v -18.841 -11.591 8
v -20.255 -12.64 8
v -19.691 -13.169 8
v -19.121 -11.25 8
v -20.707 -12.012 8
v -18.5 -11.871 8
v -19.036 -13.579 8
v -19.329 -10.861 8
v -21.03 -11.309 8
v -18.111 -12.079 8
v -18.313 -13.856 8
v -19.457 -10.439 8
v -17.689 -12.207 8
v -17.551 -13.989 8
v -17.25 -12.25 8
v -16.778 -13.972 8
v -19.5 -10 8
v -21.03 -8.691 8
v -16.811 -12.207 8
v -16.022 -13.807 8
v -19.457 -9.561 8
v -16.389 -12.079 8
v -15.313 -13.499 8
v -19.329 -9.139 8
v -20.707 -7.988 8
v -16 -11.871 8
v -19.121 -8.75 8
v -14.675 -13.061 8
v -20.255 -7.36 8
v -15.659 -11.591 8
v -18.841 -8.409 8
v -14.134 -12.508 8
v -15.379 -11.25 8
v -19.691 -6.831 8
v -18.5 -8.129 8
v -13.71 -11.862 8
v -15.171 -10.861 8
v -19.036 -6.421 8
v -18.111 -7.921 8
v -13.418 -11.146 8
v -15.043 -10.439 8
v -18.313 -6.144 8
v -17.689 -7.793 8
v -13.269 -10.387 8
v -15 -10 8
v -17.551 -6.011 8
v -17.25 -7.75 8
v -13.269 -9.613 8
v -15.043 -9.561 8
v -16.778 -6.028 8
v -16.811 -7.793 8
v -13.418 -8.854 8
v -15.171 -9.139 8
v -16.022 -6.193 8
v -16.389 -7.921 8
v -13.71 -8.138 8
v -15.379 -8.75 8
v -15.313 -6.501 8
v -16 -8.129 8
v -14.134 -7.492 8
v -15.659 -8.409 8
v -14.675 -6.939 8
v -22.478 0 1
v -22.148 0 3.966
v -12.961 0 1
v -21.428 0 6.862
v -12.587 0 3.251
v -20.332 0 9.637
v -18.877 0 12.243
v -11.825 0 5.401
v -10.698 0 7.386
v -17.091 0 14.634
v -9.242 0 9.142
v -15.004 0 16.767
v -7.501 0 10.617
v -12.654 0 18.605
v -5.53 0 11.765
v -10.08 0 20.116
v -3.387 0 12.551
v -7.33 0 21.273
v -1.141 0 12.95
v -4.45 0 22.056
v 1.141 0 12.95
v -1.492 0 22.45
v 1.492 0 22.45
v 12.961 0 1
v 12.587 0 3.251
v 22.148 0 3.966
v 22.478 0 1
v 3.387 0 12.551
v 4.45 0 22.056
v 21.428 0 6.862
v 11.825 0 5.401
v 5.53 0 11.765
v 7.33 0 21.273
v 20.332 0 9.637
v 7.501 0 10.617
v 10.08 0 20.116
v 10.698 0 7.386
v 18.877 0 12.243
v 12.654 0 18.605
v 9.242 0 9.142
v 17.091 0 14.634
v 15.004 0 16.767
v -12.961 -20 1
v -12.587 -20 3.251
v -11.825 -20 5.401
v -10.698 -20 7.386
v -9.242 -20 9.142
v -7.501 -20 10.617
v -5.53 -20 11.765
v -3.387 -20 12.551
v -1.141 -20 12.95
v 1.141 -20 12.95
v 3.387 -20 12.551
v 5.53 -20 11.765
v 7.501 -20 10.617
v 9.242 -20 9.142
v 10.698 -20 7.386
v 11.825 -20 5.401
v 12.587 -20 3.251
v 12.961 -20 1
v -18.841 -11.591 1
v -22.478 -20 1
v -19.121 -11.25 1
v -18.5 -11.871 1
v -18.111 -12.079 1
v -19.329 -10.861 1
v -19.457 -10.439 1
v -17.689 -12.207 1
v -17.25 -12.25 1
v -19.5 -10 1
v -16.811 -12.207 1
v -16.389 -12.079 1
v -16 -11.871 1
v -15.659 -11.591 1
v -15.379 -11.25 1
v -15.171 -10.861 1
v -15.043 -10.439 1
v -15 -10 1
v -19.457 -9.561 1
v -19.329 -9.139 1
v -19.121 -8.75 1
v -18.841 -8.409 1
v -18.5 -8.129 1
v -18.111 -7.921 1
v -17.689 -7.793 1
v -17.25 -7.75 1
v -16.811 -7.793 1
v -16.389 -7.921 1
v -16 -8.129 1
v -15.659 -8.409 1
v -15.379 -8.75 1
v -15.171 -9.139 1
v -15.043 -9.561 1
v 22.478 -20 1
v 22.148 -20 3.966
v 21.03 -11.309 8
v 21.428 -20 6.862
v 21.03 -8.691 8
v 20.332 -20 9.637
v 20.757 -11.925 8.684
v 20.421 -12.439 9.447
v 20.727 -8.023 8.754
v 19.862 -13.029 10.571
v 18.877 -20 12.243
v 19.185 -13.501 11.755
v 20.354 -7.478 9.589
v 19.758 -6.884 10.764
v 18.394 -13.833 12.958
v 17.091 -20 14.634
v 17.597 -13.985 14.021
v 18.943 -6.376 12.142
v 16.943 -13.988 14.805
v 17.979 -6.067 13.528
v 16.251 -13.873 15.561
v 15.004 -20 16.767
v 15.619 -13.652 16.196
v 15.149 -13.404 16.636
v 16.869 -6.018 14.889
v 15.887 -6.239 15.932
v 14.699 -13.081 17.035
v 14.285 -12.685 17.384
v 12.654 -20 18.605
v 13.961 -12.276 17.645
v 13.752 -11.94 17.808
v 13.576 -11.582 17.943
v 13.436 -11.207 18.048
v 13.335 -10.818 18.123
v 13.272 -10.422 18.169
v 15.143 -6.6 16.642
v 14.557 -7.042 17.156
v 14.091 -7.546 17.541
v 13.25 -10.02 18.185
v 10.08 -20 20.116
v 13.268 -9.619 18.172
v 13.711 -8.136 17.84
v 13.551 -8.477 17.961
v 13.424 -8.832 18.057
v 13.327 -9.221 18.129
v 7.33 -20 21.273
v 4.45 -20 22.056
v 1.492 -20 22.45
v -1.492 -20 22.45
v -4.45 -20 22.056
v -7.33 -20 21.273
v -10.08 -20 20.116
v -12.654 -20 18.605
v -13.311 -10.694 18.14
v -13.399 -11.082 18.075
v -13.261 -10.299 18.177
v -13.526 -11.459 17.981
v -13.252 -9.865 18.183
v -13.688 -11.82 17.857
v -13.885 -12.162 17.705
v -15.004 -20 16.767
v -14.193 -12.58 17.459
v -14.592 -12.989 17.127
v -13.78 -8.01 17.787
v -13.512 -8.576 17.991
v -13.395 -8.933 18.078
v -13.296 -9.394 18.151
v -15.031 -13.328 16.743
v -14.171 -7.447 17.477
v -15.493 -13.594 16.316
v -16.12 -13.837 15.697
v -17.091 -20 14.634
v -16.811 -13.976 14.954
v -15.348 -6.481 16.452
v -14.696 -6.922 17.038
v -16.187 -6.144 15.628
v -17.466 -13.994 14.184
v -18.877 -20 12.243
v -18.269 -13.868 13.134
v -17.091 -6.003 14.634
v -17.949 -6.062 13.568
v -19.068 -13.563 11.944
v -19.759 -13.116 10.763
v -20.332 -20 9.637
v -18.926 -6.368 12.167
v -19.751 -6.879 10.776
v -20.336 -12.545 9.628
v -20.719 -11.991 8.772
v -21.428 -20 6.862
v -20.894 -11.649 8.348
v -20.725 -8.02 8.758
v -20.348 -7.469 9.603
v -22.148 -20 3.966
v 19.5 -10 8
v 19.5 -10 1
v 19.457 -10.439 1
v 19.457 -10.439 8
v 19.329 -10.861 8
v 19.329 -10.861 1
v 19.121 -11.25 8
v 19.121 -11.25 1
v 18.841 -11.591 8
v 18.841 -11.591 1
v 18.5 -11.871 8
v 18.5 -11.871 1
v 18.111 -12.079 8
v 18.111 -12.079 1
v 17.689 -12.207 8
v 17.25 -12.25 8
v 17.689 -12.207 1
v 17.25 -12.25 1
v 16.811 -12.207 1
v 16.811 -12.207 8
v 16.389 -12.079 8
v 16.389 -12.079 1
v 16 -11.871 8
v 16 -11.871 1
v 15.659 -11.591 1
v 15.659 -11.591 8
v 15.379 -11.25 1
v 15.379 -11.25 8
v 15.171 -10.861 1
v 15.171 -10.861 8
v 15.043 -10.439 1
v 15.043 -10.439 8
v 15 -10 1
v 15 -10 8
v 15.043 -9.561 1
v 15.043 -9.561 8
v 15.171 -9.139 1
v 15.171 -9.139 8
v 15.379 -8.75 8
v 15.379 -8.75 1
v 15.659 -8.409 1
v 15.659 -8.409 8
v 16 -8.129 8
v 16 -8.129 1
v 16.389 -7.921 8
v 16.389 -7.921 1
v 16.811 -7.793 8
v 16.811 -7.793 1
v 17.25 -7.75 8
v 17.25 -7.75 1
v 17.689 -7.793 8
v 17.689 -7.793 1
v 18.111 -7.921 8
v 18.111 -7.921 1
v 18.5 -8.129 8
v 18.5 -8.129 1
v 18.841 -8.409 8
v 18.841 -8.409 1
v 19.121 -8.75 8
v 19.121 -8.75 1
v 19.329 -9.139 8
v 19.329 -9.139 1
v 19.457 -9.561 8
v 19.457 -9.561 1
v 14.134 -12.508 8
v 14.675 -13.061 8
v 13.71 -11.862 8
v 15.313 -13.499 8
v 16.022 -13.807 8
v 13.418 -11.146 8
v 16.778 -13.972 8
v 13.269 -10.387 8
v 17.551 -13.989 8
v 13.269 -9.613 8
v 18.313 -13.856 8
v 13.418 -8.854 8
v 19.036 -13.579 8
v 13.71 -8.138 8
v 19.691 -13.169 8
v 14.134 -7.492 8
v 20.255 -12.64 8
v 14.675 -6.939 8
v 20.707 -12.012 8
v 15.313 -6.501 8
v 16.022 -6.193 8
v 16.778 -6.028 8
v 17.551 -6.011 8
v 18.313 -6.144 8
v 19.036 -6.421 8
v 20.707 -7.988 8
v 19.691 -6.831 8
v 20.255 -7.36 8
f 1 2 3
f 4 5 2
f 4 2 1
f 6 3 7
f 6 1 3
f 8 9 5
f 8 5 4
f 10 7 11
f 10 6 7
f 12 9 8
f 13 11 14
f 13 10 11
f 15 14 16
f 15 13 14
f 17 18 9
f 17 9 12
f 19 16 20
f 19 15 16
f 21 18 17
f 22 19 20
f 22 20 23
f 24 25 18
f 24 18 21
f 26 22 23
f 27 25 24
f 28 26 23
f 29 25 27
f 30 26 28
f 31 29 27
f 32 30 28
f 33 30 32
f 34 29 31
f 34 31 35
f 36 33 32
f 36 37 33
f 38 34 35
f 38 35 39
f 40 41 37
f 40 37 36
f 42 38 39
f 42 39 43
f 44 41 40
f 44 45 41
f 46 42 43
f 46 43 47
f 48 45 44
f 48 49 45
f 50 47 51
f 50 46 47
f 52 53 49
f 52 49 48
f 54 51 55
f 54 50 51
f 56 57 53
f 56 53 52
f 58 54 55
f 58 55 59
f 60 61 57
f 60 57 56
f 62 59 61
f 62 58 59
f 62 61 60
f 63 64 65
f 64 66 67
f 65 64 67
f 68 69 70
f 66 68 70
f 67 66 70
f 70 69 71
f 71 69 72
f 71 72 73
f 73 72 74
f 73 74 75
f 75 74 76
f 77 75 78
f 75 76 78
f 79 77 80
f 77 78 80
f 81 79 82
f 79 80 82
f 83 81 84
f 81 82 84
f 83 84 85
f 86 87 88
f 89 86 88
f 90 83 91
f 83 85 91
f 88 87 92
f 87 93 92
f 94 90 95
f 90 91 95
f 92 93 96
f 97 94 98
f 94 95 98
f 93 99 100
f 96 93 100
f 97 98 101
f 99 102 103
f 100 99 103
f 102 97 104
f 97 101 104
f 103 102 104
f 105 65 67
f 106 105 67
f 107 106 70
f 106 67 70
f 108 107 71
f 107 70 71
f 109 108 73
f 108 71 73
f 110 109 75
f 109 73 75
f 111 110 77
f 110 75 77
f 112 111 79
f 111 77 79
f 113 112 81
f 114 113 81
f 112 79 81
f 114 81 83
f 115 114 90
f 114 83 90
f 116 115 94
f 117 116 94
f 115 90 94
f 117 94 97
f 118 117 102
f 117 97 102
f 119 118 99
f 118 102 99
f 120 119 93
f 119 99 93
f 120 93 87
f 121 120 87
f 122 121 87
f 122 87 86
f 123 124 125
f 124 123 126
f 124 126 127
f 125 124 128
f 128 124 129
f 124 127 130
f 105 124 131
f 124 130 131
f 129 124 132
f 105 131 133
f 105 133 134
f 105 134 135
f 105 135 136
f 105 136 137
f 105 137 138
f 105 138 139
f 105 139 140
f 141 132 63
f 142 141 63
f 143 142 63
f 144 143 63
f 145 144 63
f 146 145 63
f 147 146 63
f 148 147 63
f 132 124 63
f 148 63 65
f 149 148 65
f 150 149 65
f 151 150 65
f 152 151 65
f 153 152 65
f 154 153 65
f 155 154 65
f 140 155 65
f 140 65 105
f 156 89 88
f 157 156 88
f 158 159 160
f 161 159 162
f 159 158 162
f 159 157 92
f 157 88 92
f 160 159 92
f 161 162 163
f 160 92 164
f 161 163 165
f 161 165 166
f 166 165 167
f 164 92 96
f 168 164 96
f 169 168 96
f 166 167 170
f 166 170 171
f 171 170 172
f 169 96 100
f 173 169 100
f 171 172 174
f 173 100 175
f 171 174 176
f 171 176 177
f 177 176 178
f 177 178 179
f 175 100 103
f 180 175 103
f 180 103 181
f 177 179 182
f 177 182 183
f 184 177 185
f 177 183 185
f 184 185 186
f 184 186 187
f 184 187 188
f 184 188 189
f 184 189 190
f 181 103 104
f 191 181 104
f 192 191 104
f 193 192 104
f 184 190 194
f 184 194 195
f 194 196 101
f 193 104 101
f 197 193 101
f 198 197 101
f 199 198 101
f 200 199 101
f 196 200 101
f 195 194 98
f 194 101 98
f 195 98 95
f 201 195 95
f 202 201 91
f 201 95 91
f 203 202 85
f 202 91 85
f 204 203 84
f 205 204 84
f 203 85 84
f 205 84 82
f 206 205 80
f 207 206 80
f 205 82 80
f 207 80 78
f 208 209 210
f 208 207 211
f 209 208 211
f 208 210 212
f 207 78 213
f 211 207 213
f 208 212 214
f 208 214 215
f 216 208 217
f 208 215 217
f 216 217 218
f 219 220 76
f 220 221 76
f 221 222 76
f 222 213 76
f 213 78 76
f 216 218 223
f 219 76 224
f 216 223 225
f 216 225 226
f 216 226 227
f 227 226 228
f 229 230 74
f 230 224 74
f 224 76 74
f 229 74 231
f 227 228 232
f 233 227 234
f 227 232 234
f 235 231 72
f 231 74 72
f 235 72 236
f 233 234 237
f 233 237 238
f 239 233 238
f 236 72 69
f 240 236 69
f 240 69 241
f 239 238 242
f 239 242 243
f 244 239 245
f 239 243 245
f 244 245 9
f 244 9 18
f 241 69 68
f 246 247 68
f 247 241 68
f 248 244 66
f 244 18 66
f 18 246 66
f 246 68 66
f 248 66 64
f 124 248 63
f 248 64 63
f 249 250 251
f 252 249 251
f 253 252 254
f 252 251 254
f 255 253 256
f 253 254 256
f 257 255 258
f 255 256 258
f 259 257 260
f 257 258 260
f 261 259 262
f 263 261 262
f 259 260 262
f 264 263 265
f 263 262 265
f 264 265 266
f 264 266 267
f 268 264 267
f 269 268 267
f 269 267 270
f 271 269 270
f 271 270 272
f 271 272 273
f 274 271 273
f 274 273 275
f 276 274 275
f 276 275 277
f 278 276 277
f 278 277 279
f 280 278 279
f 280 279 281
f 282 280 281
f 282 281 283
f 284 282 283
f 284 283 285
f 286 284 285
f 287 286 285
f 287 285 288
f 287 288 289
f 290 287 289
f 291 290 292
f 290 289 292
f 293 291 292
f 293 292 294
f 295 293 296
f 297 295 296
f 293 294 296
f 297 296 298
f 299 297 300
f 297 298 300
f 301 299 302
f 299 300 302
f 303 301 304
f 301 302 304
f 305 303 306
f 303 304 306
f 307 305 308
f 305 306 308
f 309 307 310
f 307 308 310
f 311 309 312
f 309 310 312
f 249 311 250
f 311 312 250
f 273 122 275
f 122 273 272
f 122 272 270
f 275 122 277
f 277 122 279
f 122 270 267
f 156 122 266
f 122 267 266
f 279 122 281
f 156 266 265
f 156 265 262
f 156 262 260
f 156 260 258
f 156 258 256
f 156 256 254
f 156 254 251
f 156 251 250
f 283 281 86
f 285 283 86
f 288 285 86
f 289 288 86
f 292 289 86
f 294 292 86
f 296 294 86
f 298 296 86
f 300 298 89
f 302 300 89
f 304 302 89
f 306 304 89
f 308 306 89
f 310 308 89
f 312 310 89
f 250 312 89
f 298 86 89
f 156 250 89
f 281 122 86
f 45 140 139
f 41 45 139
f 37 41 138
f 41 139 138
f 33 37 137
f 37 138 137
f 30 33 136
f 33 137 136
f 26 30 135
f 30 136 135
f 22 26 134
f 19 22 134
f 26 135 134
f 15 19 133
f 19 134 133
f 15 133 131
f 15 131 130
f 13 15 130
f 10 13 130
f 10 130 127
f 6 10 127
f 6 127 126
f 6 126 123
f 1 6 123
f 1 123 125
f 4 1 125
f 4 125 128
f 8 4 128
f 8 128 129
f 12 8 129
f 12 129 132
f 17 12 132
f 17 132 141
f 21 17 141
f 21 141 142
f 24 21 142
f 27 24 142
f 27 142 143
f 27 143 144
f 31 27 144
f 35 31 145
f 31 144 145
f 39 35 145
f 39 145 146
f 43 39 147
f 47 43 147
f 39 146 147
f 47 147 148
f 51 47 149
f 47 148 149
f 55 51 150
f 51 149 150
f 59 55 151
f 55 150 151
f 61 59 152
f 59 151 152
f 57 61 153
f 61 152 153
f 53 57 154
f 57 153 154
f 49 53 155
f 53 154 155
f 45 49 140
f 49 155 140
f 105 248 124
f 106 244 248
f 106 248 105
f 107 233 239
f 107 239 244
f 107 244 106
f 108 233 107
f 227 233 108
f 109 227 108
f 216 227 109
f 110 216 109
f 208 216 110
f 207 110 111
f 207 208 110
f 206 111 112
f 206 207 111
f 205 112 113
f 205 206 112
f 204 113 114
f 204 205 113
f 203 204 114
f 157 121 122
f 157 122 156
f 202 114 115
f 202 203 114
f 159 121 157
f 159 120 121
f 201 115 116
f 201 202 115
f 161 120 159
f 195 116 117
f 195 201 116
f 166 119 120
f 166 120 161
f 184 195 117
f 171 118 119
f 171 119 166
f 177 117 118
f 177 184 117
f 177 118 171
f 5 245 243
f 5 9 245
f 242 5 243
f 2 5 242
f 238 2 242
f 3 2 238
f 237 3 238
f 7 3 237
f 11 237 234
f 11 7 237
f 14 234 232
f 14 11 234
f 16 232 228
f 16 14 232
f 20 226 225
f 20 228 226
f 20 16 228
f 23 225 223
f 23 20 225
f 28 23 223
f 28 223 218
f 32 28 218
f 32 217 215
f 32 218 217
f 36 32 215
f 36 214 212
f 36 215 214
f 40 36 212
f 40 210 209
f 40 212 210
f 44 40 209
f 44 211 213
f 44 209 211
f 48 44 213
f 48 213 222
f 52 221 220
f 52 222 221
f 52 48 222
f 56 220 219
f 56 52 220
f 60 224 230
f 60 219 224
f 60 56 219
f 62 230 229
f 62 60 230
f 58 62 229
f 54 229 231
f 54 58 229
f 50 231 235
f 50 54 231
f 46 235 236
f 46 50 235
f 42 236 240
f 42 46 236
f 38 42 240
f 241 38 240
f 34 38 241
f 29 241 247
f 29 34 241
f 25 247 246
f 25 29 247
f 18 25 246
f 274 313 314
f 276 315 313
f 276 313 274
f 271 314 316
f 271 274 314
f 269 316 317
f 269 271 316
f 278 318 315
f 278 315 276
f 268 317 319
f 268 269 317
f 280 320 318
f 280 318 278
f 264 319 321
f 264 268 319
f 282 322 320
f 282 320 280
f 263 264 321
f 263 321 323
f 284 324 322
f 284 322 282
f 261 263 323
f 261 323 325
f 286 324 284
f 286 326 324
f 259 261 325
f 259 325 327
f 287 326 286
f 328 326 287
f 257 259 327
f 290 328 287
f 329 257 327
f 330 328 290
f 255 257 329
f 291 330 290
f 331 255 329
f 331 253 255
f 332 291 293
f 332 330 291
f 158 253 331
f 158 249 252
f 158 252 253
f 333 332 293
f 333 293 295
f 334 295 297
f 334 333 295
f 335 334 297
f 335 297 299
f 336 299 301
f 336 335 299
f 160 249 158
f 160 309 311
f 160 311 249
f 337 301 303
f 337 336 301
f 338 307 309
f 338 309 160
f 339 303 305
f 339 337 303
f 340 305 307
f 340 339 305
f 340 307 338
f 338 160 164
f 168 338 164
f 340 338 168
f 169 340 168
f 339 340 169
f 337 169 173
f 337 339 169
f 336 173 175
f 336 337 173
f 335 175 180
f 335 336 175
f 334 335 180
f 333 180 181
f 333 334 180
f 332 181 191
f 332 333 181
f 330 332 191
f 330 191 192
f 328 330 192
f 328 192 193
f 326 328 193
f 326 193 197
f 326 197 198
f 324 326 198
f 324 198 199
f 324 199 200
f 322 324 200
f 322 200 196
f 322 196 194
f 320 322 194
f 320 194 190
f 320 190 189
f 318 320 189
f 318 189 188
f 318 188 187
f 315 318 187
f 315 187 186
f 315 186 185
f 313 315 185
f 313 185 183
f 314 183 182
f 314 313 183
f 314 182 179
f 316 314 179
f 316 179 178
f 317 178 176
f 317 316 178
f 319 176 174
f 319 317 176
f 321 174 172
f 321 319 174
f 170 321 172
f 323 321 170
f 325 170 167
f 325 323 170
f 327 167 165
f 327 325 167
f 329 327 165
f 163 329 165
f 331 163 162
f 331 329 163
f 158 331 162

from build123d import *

# Parameters (mm, degrees)
F1_DEPTH = 20
F2_R     = 2.25
F3_DEPTH = 21.501
F5_R     = 4
F6_DEPTH = 14.501


with BuildPart() as f1:
    # F0 (on Front) → F1 (new body)
    with BuildSketch(Plane.XZ):
        with BuildLine():
            ThreePointArc((-12.961481, 1), (0, 13), (12.961481, 1))
            Line((12.961481, 1), (22.477767, 1))
            ThreePointArc((22.477767, 1), (0, 22.5), (-22.477767, 1))
            Line((-22.477767, 1), (-12.961481, 1))
        make_face()
    extrude(amount=F1_DEPTH)

    # F2 (on face) → F3 (cut, through all)
    with BuildSketch(Plane(origin=(0, 0, 1), x_dir=(1, 0, 0), z_dir=(0, 0, -1))):
        with Locations((-17.25, 10)):
            Circle(F2_R)
        with Locations((17.25, 10)):
            Circle(F2_R)
    extrude(amount=-F3_DEPTH, mode=Mode.SUBTRACT)

    # F5 (on offset) → F6 (cut, through all)
    with BuildSketch(Plane.XY.offset(8)):
        with Locations((-17.25, -10)):
            Circle(F5_R)
        with Locations((17.25, -10)):
            Circle(F5_R)
    extrude(amount=F6_DEPTH, mode=Mode.SUBTRACT)


solid = f1.part
